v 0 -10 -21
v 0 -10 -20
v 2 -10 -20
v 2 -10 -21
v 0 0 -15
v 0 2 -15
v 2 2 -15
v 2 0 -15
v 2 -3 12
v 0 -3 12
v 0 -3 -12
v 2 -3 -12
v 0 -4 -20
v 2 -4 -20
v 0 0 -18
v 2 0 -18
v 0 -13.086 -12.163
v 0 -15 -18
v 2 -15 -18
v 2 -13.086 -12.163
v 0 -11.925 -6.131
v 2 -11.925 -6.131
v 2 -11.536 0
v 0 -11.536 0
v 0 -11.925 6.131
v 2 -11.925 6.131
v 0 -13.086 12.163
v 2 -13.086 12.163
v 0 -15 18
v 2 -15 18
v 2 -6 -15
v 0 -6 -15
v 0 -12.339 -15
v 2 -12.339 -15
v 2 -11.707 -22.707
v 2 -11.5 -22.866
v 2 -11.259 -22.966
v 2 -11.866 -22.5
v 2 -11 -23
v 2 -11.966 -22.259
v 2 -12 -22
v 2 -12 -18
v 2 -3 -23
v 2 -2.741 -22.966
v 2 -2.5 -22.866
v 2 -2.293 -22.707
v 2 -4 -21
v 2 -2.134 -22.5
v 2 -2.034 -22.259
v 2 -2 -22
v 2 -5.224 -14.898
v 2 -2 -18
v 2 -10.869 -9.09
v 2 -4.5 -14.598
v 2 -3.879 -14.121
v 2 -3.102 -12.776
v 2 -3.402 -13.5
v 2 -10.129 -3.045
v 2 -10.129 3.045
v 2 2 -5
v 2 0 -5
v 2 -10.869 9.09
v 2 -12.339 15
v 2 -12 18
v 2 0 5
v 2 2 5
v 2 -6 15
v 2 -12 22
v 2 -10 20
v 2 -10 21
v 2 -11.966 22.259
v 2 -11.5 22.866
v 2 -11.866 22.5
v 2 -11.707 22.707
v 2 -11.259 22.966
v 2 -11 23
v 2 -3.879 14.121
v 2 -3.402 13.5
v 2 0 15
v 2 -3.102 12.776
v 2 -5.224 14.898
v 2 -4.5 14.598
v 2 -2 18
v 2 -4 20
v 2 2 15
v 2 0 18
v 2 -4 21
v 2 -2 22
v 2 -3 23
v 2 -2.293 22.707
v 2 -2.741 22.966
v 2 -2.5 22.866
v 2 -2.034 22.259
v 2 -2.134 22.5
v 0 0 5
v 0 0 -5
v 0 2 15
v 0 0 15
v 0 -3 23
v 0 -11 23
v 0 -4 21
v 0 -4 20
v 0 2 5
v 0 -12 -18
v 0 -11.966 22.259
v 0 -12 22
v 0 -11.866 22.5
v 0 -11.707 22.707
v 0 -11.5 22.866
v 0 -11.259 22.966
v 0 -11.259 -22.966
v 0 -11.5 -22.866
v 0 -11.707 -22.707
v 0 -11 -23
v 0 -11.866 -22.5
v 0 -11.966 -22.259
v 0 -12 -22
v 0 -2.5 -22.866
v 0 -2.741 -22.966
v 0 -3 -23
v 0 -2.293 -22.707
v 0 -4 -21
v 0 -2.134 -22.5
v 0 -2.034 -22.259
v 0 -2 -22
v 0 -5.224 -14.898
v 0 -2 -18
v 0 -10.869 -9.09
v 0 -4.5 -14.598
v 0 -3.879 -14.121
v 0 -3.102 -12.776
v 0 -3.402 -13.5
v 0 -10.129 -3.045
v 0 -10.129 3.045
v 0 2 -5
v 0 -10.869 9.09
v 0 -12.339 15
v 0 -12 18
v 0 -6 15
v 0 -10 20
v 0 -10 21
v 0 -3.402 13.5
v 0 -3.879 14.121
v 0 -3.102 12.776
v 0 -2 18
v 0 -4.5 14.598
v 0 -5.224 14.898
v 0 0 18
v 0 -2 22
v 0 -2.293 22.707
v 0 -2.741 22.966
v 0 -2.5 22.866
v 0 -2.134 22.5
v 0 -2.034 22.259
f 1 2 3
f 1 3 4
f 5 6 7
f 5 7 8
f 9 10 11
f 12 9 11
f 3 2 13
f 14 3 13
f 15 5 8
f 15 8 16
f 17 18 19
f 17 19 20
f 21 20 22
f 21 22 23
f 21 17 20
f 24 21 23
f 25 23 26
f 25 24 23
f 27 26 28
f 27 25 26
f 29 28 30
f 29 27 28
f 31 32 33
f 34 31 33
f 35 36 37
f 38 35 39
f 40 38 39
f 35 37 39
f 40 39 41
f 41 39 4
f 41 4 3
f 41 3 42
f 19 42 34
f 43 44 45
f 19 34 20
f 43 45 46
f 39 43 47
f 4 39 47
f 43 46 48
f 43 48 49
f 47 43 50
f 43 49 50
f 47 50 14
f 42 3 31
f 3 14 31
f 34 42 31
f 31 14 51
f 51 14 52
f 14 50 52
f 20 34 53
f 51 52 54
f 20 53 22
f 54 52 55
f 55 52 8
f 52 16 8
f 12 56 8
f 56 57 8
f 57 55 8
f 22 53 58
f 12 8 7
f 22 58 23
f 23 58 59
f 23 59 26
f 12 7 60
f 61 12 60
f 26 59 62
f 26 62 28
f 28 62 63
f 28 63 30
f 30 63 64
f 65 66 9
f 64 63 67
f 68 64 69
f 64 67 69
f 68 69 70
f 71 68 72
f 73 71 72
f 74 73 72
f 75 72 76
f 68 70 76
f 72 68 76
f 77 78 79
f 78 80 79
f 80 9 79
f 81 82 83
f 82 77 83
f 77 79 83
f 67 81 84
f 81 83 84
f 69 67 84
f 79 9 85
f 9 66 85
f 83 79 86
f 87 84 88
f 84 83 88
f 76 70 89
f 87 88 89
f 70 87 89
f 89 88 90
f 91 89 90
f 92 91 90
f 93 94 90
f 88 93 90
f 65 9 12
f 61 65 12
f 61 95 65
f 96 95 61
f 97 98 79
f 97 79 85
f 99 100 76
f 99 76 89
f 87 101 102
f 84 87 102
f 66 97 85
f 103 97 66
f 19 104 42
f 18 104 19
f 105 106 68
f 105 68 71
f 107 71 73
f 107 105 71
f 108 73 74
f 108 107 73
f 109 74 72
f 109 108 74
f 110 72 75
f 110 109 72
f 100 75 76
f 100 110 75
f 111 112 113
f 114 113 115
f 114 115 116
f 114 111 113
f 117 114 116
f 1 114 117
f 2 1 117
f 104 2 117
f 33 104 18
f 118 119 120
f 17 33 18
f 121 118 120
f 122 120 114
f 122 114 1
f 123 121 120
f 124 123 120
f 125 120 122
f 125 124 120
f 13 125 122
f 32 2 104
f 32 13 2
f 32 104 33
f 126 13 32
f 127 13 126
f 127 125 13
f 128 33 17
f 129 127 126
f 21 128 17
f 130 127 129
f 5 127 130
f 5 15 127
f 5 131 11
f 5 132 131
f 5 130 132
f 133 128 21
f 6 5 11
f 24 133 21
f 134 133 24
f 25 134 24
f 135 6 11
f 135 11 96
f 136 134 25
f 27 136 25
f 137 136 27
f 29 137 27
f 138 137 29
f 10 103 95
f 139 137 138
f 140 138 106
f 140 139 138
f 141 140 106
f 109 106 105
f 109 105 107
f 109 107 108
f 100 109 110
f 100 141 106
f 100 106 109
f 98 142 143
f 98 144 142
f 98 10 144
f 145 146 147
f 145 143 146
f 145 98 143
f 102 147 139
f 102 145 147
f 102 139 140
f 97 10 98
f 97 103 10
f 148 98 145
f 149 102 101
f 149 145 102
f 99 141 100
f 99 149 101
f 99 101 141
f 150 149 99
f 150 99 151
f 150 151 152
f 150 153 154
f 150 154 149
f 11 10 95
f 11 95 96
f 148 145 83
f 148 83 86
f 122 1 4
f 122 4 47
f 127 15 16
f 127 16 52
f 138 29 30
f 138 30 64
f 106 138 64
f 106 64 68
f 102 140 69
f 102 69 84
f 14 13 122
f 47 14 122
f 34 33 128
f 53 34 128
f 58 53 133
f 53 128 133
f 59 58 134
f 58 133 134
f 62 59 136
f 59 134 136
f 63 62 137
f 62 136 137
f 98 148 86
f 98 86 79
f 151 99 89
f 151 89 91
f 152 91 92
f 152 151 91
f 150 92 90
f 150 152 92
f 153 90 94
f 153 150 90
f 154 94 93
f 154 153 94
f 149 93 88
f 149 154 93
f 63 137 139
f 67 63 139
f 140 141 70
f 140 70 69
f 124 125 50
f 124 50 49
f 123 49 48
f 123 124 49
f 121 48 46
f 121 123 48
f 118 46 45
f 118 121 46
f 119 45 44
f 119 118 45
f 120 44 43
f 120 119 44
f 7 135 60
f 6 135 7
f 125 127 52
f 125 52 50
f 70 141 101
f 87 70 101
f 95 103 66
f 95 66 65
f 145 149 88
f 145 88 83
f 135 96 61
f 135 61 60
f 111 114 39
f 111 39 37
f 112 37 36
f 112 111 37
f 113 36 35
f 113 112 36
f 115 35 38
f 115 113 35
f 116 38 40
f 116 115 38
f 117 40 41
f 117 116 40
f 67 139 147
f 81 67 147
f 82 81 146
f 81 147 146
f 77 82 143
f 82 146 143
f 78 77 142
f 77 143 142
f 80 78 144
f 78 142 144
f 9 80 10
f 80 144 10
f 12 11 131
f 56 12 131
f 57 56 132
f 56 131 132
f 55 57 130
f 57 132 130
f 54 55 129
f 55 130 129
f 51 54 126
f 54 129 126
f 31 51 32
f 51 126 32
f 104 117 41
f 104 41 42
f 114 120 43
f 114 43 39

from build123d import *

# Parameters (mm, degrees)
SKETCH1_W           = 1
SKETCH1_H           = 6
BOSS_EXTRUDE1_DEPTH = 2


with BuildPart() as part:
    # Sketch1 → Boss-Extrude1 (new body)
    with BuildSketch(Plane(origin=(0, 0, 0), x_dir=(0, 0, -1), z_dir=(1, 0, 0))):
        with BuildLine():
            Line((-18, 0), (-15, 0))
            Line((-15, 0), (-15, 2))
            Line((-15, 2), (-5, 2))
            Line((-5, 2), (-5, 0))
            Line((-5, 0), (5, 0))
            Line((5, 0), (5, 2))
            Line((5, 2), (15, 2))
            Line((15, 2), (15, 0))
            Line((15, 0), (18, 0))
            Line((18, 0), (18, -2))
            Line((18, -2), (22, -2))
            ThreePointArc((22, -2), (22.707106781, -2.292893219), (23, -3))
            Line((23, -3), (23, -11))
            ThreePointArc((23, -11), (22.707106781, -11.707106781), (22, -12))
            Line((22, -12), (18, -12))
            Line((18, -12), (18, -15))
            ThreePointArc((18, -15), (0, -11.536096634), (-18, -15))
            Line((-18, -15), (-18, -12))
            Line((-18, -12), (-22, -12))
            ThreePointArc((-22, -12), (-22.707106781, -11.707106781), (-23, -11))
            Line((-23, -11), (-23, -3))
            ThreePointArc((-23, -3), (-22.707106781, -2.292893219), (-22, -2))
            Line((-22, -2), (-18, -2))
            Line((-18, -2), (-18, 0))
        make_face()
        with BuildLine():
            Line((-15, -12.339136563), (-15, -6))
            ThreePointArc((-15, -6), (-14.121320344, -3.878679656), (-12, -3))
            Line((-12, -3), (12, -3))
            ThreePointArc((12, -3), (14.121320344, -3.878679656), (15, -6))
            Line((15, -6), (15, -12.339136563))
            ThreePointArc((15, -12.339136563), (0, -10.036096634), (-15, -12.339136563))
        make_face(mode=Mode.SUBTRACT)
        with Locations((-20.5, -7)):
            Rectangle(SKETCH1_W, SKETCH1_H, mode=Mode.SUBTRACT)
        with Locations((20.5, -7)):
            Rectangle(SKETCH1_W, SKETCH1_H, mode=Mode.SUBTRACT)
    extrude(amount=BOSS_EXTRUDE1_DEPTH)


solid = part.part
